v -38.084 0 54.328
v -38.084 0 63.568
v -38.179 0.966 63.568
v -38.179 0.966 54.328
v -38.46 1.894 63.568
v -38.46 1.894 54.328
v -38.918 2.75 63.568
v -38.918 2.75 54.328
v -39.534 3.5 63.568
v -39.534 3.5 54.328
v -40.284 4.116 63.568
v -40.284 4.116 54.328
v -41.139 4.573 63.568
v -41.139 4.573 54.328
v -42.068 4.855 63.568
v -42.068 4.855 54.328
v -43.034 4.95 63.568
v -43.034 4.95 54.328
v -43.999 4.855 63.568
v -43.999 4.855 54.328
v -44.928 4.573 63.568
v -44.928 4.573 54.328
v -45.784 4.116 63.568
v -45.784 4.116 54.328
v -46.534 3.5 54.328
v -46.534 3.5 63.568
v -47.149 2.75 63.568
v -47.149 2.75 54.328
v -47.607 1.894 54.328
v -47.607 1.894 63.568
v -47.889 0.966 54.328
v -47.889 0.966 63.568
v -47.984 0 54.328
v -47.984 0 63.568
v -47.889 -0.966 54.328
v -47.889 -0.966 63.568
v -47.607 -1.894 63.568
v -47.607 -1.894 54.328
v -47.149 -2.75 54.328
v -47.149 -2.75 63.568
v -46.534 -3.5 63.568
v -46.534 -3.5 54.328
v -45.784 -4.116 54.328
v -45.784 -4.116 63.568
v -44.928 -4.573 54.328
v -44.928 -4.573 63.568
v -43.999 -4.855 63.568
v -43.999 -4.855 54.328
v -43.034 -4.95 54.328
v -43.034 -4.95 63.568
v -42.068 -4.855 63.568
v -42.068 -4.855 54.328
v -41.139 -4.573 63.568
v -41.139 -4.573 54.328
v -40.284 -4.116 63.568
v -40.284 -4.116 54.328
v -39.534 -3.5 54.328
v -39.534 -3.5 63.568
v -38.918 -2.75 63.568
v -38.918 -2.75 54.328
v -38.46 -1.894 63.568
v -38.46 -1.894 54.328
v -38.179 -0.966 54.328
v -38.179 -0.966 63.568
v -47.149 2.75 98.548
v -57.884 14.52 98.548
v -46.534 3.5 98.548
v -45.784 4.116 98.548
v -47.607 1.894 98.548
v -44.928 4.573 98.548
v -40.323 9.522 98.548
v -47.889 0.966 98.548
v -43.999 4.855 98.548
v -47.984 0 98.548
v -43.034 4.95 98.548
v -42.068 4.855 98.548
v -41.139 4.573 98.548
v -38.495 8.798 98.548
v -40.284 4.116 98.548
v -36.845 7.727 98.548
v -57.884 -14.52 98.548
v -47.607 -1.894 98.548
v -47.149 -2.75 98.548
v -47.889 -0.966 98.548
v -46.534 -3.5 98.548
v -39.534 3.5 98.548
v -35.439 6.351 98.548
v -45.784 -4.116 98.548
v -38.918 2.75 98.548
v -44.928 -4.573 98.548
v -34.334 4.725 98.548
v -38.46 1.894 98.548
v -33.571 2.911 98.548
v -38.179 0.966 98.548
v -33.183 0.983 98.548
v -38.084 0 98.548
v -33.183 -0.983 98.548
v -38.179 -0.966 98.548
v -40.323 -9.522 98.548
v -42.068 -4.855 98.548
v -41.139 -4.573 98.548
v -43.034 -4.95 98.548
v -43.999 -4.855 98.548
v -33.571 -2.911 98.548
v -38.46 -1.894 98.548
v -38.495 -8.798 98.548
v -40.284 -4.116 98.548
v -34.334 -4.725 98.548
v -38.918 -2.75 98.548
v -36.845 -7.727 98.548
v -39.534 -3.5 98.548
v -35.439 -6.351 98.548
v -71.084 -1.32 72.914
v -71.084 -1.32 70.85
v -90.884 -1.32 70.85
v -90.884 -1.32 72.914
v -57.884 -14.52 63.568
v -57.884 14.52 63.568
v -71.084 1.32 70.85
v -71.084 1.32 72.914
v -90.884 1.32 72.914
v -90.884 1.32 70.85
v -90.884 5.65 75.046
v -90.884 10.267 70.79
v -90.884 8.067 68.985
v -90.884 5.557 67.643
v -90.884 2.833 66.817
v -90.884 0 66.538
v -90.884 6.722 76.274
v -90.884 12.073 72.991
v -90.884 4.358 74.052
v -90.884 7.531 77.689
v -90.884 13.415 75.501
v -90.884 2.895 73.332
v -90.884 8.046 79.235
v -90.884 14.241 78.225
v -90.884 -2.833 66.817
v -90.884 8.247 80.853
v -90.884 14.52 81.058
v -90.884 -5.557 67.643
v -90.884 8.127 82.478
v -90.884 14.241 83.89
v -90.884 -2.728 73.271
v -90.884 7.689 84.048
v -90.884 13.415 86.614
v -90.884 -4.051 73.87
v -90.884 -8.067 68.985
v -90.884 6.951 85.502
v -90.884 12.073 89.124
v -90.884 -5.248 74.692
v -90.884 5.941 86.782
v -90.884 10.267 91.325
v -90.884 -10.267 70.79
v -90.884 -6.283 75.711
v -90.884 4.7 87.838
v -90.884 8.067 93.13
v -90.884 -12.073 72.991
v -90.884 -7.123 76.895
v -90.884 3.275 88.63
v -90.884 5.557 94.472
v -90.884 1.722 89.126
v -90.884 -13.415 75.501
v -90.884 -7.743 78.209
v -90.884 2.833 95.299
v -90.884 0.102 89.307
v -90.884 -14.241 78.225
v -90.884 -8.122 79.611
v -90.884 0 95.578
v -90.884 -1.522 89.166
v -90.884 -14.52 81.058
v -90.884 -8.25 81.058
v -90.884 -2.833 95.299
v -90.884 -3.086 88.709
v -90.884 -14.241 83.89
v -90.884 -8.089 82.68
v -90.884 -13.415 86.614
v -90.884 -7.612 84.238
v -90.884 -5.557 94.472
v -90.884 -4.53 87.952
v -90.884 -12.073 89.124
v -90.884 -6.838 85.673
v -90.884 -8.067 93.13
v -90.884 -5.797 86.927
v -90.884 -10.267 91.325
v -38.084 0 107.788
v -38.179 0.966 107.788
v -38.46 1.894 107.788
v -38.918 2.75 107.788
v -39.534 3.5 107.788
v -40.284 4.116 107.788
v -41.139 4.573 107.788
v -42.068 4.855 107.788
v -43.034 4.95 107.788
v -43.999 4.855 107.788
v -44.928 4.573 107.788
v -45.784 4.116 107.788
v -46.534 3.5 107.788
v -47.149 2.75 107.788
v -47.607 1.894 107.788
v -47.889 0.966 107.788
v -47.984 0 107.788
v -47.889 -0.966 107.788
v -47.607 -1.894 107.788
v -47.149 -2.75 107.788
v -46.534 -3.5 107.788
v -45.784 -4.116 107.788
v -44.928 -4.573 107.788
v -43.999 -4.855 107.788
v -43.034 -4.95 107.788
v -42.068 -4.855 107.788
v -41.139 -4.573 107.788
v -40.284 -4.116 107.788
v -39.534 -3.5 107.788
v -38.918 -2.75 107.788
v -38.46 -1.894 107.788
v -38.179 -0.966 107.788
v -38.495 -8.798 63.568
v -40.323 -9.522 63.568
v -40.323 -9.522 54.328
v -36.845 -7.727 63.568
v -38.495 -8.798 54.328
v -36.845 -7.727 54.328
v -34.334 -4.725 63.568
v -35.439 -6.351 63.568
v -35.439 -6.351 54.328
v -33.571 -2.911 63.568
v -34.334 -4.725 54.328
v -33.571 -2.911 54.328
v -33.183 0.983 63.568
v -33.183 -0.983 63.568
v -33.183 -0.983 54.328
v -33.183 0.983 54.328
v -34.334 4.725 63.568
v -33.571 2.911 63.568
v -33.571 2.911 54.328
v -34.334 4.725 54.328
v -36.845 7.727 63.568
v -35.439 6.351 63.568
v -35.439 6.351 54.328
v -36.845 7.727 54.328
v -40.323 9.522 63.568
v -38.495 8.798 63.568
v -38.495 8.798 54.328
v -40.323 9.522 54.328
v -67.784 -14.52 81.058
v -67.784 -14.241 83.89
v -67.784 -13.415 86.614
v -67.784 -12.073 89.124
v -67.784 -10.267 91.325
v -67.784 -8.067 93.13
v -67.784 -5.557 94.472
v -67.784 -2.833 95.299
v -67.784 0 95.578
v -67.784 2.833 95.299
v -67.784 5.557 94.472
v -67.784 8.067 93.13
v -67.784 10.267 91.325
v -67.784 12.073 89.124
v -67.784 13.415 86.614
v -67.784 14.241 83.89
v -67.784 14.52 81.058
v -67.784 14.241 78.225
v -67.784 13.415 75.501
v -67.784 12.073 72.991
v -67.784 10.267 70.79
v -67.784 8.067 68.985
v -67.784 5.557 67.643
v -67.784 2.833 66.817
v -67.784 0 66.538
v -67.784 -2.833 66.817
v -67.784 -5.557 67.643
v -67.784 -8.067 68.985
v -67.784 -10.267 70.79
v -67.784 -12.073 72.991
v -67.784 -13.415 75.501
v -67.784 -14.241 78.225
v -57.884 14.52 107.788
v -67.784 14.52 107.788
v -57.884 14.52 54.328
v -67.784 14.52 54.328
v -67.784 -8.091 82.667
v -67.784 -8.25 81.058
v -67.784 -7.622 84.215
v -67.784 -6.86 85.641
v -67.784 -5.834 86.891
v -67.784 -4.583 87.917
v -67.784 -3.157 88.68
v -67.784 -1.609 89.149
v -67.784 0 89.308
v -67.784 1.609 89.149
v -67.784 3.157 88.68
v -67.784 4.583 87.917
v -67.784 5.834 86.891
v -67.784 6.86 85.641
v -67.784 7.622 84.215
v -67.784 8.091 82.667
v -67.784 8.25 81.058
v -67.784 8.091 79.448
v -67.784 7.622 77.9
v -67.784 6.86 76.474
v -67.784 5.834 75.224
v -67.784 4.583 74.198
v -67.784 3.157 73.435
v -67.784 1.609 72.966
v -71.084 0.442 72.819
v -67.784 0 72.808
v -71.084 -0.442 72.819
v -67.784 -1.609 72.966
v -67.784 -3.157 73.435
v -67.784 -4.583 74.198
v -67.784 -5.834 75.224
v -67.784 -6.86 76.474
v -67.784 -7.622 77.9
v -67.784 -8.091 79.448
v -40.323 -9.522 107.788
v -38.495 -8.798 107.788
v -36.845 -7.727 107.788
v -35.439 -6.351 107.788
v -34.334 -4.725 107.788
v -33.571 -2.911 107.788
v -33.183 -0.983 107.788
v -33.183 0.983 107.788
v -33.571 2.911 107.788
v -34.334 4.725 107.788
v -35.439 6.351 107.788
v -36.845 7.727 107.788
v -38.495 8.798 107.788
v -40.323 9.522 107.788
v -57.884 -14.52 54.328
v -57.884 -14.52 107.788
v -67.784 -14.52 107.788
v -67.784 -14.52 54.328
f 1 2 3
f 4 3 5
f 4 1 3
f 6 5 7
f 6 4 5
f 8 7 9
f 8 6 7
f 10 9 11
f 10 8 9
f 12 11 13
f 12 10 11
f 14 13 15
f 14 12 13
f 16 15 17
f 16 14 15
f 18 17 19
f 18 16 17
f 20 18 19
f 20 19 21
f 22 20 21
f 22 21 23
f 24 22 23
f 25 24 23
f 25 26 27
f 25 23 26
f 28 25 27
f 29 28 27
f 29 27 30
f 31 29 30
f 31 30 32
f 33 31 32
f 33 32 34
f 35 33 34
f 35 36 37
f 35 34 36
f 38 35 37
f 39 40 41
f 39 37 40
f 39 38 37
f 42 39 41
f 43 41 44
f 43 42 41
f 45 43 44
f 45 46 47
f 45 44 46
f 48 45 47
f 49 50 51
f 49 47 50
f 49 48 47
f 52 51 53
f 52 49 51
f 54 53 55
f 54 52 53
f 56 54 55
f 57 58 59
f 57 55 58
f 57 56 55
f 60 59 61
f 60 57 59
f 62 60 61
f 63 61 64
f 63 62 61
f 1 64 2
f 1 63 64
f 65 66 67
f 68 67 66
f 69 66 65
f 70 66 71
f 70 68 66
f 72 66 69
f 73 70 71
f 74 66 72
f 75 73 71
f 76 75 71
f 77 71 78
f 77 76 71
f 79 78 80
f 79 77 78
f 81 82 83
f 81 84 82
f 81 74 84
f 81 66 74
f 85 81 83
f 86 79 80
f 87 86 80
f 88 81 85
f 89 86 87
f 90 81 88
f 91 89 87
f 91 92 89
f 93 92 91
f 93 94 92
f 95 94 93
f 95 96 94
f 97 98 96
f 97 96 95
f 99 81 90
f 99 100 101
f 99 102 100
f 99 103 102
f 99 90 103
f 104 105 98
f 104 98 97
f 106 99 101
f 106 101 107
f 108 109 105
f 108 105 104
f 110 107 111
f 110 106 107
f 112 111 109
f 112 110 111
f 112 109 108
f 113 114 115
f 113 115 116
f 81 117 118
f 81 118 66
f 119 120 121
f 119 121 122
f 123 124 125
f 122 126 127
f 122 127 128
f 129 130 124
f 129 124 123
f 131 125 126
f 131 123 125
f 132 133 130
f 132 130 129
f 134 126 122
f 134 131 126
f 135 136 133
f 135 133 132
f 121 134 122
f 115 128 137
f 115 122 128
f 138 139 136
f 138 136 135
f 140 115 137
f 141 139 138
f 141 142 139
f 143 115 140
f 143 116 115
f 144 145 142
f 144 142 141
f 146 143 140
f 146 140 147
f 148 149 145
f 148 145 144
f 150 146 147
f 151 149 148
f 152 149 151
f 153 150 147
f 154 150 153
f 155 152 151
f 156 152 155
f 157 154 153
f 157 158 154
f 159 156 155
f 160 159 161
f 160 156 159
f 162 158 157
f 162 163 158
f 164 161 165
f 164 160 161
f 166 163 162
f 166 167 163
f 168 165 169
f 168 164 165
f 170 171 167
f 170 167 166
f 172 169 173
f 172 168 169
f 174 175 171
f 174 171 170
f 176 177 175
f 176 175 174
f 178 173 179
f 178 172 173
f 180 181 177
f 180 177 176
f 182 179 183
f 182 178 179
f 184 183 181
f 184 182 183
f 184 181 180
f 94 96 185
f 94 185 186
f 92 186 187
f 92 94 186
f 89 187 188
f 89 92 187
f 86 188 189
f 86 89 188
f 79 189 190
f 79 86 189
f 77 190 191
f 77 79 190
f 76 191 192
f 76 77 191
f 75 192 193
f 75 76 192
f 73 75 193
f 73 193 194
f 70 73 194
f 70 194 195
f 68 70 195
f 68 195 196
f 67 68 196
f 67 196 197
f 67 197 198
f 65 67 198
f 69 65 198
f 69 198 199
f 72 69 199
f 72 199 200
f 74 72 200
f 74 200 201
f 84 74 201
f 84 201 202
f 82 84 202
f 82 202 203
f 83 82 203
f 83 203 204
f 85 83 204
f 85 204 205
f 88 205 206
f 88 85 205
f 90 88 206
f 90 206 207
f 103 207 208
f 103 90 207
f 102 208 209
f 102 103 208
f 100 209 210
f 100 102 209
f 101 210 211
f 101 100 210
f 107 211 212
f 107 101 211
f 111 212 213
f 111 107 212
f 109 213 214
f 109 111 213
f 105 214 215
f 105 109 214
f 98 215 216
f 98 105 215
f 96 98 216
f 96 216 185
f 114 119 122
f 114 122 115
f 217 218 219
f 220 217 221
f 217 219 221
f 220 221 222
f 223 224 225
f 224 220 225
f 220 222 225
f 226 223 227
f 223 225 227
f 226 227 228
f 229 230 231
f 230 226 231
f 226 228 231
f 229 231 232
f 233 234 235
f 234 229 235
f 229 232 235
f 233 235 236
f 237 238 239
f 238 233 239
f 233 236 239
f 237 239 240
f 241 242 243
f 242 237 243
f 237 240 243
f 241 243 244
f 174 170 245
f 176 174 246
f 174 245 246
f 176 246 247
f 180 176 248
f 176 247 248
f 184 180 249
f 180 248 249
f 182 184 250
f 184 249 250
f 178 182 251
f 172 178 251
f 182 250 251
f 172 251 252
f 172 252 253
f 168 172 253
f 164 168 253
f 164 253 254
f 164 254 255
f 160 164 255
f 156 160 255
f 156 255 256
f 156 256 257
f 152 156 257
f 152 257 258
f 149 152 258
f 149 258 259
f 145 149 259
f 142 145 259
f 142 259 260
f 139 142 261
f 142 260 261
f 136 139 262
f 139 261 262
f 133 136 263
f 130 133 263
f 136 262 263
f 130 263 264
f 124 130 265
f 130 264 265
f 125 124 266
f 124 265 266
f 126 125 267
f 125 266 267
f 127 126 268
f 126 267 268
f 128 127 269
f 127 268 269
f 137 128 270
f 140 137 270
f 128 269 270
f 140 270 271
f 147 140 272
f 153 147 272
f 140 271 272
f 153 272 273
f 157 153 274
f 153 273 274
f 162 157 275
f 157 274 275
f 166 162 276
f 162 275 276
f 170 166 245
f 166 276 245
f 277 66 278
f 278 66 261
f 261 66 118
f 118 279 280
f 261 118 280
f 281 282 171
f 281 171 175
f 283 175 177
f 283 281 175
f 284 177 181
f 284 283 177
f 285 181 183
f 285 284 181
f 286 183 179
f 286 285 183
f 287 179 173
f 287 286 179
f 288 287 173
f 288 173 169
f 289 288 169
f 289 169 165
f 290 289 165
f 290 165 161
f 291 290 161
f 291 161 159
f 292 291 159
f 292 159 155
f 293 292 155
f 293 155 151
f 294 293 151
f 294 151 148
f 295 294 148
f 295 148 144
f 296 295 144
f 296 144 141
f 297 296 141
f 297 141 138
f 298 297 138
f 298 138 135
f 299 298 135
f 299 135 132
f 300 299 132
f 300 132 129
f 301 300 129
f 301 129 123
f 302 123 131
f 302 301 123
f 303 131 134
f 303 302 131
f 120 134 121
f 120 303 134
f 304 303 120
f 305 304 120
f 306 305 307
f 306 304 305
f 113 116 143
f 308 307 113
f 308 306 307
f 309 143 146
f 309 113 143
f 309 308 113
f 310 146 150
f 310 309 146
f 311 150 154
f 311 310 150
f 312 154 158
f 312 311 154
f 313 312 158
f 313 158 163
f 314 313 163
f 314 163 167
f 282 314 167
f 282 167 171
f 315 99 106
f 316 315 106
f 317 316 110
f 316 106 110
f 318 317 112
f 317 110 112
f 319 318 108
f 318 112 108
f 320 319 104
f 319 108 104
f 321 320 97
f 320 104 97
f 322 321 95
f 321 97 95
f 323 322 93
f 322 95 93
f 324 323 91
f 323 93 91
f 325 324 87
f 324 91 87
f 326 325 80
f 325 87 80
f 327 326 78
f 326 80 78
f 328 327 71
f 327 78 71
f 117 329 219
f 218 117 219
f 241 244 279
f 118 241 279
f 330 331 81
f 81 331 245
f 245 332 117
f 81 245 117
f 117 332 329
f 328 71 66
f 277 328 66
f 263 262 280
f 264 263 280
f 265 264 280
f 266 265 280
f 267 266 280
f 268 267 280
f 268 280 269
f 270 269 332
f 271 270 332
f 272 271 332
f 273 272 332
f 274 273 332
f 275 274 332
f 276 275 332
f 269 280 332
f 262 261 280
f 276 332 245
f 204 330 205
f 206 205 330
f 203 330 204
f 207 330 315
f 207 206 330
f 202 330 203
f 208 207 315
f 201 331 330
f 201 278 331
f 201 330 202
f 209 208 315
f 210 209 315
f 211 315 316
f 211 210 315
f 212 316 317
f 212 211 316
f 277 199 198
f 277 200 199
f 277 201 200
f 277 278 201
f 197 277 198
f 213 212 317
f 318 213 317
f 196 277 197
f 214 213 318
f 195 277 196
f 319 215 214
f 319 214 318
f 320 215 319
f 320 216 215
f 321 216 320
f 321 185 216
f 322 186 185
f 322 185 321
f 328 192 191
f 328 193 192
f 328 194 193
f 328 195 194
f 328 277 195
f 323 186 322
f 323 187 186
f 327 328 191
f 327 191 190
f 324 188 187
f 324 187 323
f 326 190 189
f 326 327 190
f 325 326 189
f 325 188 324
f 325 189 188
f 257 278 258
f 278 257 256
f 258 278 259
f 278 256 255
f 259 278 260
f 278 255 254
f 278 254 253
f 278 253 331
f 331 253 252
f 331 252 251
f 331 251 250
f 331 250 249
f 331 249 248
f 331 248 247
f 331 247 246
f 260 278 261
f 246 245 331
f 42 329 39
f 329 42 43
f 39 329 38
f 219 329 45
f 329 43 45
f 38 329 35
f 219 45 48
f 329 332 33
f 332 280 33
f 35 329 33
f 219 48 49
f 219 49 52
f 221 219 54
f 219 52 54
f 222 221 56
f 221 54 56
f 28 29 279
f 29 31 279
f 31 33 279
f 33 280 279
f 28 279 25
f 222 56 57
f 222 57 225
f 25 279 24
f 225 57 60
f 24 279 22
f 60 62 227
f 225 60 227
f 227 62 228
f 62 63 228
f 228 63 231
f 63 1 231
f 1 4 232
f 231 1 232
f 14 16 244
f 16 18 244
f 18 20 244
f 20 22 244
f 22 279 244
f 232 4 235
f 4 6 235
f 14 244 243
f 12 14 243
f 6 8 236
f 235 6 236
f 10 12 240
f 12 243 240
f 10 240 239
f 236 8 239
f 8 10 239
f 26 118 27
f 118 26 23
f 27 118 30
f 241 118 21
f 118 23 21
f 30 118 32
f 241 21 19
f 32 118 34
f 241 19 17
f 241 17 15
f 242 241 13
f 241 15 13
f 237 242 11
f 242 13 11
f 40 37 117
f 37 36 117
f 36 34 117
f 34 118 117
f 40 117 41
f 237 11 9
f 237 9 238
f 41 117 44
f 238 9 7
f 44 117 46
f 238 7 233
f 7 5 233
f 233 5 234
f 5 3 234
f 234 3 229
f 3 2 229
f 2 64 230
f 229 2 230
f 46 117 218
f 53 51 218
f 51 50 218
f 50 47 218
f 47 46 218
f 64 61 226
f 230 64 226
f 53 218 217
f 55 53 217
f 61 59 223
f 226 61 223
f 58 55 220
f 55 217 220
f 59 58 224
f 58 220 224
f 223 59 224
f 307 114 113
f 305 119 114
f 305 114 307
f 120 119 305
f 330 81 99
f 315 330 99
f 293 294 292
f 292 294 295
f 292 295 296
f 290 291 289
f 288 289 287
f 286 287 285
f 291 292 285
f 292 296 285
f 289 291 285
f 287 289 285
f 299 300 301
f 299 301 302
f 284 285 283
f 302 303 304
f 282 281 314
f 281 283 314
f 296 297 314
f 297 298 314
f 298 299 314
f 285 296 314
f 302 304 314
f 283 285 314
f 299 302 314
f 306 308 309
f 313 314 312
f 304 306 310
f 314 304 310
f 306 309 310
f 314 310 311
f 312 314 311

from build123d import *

# Parameters (mm, degrees)
SKETCH2_R           = 15
BOSS_EXTRUDE1_DEPTH = 162
SKETCH3_W           = 75
SKETCH3_H           = 106
CUT_EXTRUDE1_DEPTH  = 200.03014847
SKETCH4_R           = 44
SKETCH4_R_2         = 25
BOSS_EXTRUDE2_DEPTH = 70
CUT_EXTRUDE5_START  = -60
CUT_EXTRUDE5_DEPTH  = 60
SCALE1_SCALE        = 0.33


with BuildPart() as part:
    # Sketch2 → Boss-Extrude1 (new body)
    with BuildSketch(Plane.XY):
        with BuildLine():
            Line((-75, -44), (-45, -44))
            Line((-45, -44), (8.212754936, -28.853953912))
            ThreePointArc((8.212754936, -28.853953912), (30, 0), (8.212754936, 28.853953912))
            Line((8.212754936, 28.853953912), (-45, 44))
            Line((-45, 44), (-75, 44))
            Line((-75, 44), (-75, -44))
        make_face()
        Circle(SKETCH2_R, mode=Mode.SUBTRACT)
    extrude(amount=BOSS_EXTRUDE1_DEPTH)

    # Sketch3 → Cut-Extrude1 (cut, through all)
    with BuildSketch(Plane.XZ.offset(44)):
        with Locations((-7.5, 81)):
            Rectangle(SKETCH3_W, SKETCH3_H)
    extrude(amount=-CUT_EXTRUDE1_DEPTH, mode=Mode.SUBTRACT)

    # Sketch4 → Boss-Extrude2 (add)
    with BuildSketch(Plane.ZY.offset(75)):
        with Locations(Location((81, 0, 0), (0, 0, 270))):
            Circle(SKETCH4_R)
        with Locations(Location((81, 0, 0), (0, 0, 270))):
            Circle(SKETCH4_R_2, mode=Mode.SUBTRACT)
    extrude(amount=BOSS_EXTRUDE2_DEPTH)

    # Sketch7 → Cut-Extrude5 (cut)
    with BuildSketch(Plane.ZY.offset(145).offset(CUT_EXTRUDE5_START)):
        with BuildLine():
            Line((50.06906521, -4), (56.322074641, -4))
            ThreePointArc((56.322074641, -4), (56, 0), (56.322074641, 4))
            Line((56.322074641, 4), (50.06906521, 4))
            Line((50.06906521, 4), (50.06906521, -4))
        make_face()
    extrude(amount=CUT_EXTRUDE5_DEPTH, mode=Mode.SUBTRACT)


with BuildPart() as part_1:
    # Scale1: scaled about (-64.229382242, 0, 81.085826585)
    add(part.part.scale(SCALE1_SCALE).moved(Location((-43.033686102, 0, 54.327503812))))


solid = part_1.part
